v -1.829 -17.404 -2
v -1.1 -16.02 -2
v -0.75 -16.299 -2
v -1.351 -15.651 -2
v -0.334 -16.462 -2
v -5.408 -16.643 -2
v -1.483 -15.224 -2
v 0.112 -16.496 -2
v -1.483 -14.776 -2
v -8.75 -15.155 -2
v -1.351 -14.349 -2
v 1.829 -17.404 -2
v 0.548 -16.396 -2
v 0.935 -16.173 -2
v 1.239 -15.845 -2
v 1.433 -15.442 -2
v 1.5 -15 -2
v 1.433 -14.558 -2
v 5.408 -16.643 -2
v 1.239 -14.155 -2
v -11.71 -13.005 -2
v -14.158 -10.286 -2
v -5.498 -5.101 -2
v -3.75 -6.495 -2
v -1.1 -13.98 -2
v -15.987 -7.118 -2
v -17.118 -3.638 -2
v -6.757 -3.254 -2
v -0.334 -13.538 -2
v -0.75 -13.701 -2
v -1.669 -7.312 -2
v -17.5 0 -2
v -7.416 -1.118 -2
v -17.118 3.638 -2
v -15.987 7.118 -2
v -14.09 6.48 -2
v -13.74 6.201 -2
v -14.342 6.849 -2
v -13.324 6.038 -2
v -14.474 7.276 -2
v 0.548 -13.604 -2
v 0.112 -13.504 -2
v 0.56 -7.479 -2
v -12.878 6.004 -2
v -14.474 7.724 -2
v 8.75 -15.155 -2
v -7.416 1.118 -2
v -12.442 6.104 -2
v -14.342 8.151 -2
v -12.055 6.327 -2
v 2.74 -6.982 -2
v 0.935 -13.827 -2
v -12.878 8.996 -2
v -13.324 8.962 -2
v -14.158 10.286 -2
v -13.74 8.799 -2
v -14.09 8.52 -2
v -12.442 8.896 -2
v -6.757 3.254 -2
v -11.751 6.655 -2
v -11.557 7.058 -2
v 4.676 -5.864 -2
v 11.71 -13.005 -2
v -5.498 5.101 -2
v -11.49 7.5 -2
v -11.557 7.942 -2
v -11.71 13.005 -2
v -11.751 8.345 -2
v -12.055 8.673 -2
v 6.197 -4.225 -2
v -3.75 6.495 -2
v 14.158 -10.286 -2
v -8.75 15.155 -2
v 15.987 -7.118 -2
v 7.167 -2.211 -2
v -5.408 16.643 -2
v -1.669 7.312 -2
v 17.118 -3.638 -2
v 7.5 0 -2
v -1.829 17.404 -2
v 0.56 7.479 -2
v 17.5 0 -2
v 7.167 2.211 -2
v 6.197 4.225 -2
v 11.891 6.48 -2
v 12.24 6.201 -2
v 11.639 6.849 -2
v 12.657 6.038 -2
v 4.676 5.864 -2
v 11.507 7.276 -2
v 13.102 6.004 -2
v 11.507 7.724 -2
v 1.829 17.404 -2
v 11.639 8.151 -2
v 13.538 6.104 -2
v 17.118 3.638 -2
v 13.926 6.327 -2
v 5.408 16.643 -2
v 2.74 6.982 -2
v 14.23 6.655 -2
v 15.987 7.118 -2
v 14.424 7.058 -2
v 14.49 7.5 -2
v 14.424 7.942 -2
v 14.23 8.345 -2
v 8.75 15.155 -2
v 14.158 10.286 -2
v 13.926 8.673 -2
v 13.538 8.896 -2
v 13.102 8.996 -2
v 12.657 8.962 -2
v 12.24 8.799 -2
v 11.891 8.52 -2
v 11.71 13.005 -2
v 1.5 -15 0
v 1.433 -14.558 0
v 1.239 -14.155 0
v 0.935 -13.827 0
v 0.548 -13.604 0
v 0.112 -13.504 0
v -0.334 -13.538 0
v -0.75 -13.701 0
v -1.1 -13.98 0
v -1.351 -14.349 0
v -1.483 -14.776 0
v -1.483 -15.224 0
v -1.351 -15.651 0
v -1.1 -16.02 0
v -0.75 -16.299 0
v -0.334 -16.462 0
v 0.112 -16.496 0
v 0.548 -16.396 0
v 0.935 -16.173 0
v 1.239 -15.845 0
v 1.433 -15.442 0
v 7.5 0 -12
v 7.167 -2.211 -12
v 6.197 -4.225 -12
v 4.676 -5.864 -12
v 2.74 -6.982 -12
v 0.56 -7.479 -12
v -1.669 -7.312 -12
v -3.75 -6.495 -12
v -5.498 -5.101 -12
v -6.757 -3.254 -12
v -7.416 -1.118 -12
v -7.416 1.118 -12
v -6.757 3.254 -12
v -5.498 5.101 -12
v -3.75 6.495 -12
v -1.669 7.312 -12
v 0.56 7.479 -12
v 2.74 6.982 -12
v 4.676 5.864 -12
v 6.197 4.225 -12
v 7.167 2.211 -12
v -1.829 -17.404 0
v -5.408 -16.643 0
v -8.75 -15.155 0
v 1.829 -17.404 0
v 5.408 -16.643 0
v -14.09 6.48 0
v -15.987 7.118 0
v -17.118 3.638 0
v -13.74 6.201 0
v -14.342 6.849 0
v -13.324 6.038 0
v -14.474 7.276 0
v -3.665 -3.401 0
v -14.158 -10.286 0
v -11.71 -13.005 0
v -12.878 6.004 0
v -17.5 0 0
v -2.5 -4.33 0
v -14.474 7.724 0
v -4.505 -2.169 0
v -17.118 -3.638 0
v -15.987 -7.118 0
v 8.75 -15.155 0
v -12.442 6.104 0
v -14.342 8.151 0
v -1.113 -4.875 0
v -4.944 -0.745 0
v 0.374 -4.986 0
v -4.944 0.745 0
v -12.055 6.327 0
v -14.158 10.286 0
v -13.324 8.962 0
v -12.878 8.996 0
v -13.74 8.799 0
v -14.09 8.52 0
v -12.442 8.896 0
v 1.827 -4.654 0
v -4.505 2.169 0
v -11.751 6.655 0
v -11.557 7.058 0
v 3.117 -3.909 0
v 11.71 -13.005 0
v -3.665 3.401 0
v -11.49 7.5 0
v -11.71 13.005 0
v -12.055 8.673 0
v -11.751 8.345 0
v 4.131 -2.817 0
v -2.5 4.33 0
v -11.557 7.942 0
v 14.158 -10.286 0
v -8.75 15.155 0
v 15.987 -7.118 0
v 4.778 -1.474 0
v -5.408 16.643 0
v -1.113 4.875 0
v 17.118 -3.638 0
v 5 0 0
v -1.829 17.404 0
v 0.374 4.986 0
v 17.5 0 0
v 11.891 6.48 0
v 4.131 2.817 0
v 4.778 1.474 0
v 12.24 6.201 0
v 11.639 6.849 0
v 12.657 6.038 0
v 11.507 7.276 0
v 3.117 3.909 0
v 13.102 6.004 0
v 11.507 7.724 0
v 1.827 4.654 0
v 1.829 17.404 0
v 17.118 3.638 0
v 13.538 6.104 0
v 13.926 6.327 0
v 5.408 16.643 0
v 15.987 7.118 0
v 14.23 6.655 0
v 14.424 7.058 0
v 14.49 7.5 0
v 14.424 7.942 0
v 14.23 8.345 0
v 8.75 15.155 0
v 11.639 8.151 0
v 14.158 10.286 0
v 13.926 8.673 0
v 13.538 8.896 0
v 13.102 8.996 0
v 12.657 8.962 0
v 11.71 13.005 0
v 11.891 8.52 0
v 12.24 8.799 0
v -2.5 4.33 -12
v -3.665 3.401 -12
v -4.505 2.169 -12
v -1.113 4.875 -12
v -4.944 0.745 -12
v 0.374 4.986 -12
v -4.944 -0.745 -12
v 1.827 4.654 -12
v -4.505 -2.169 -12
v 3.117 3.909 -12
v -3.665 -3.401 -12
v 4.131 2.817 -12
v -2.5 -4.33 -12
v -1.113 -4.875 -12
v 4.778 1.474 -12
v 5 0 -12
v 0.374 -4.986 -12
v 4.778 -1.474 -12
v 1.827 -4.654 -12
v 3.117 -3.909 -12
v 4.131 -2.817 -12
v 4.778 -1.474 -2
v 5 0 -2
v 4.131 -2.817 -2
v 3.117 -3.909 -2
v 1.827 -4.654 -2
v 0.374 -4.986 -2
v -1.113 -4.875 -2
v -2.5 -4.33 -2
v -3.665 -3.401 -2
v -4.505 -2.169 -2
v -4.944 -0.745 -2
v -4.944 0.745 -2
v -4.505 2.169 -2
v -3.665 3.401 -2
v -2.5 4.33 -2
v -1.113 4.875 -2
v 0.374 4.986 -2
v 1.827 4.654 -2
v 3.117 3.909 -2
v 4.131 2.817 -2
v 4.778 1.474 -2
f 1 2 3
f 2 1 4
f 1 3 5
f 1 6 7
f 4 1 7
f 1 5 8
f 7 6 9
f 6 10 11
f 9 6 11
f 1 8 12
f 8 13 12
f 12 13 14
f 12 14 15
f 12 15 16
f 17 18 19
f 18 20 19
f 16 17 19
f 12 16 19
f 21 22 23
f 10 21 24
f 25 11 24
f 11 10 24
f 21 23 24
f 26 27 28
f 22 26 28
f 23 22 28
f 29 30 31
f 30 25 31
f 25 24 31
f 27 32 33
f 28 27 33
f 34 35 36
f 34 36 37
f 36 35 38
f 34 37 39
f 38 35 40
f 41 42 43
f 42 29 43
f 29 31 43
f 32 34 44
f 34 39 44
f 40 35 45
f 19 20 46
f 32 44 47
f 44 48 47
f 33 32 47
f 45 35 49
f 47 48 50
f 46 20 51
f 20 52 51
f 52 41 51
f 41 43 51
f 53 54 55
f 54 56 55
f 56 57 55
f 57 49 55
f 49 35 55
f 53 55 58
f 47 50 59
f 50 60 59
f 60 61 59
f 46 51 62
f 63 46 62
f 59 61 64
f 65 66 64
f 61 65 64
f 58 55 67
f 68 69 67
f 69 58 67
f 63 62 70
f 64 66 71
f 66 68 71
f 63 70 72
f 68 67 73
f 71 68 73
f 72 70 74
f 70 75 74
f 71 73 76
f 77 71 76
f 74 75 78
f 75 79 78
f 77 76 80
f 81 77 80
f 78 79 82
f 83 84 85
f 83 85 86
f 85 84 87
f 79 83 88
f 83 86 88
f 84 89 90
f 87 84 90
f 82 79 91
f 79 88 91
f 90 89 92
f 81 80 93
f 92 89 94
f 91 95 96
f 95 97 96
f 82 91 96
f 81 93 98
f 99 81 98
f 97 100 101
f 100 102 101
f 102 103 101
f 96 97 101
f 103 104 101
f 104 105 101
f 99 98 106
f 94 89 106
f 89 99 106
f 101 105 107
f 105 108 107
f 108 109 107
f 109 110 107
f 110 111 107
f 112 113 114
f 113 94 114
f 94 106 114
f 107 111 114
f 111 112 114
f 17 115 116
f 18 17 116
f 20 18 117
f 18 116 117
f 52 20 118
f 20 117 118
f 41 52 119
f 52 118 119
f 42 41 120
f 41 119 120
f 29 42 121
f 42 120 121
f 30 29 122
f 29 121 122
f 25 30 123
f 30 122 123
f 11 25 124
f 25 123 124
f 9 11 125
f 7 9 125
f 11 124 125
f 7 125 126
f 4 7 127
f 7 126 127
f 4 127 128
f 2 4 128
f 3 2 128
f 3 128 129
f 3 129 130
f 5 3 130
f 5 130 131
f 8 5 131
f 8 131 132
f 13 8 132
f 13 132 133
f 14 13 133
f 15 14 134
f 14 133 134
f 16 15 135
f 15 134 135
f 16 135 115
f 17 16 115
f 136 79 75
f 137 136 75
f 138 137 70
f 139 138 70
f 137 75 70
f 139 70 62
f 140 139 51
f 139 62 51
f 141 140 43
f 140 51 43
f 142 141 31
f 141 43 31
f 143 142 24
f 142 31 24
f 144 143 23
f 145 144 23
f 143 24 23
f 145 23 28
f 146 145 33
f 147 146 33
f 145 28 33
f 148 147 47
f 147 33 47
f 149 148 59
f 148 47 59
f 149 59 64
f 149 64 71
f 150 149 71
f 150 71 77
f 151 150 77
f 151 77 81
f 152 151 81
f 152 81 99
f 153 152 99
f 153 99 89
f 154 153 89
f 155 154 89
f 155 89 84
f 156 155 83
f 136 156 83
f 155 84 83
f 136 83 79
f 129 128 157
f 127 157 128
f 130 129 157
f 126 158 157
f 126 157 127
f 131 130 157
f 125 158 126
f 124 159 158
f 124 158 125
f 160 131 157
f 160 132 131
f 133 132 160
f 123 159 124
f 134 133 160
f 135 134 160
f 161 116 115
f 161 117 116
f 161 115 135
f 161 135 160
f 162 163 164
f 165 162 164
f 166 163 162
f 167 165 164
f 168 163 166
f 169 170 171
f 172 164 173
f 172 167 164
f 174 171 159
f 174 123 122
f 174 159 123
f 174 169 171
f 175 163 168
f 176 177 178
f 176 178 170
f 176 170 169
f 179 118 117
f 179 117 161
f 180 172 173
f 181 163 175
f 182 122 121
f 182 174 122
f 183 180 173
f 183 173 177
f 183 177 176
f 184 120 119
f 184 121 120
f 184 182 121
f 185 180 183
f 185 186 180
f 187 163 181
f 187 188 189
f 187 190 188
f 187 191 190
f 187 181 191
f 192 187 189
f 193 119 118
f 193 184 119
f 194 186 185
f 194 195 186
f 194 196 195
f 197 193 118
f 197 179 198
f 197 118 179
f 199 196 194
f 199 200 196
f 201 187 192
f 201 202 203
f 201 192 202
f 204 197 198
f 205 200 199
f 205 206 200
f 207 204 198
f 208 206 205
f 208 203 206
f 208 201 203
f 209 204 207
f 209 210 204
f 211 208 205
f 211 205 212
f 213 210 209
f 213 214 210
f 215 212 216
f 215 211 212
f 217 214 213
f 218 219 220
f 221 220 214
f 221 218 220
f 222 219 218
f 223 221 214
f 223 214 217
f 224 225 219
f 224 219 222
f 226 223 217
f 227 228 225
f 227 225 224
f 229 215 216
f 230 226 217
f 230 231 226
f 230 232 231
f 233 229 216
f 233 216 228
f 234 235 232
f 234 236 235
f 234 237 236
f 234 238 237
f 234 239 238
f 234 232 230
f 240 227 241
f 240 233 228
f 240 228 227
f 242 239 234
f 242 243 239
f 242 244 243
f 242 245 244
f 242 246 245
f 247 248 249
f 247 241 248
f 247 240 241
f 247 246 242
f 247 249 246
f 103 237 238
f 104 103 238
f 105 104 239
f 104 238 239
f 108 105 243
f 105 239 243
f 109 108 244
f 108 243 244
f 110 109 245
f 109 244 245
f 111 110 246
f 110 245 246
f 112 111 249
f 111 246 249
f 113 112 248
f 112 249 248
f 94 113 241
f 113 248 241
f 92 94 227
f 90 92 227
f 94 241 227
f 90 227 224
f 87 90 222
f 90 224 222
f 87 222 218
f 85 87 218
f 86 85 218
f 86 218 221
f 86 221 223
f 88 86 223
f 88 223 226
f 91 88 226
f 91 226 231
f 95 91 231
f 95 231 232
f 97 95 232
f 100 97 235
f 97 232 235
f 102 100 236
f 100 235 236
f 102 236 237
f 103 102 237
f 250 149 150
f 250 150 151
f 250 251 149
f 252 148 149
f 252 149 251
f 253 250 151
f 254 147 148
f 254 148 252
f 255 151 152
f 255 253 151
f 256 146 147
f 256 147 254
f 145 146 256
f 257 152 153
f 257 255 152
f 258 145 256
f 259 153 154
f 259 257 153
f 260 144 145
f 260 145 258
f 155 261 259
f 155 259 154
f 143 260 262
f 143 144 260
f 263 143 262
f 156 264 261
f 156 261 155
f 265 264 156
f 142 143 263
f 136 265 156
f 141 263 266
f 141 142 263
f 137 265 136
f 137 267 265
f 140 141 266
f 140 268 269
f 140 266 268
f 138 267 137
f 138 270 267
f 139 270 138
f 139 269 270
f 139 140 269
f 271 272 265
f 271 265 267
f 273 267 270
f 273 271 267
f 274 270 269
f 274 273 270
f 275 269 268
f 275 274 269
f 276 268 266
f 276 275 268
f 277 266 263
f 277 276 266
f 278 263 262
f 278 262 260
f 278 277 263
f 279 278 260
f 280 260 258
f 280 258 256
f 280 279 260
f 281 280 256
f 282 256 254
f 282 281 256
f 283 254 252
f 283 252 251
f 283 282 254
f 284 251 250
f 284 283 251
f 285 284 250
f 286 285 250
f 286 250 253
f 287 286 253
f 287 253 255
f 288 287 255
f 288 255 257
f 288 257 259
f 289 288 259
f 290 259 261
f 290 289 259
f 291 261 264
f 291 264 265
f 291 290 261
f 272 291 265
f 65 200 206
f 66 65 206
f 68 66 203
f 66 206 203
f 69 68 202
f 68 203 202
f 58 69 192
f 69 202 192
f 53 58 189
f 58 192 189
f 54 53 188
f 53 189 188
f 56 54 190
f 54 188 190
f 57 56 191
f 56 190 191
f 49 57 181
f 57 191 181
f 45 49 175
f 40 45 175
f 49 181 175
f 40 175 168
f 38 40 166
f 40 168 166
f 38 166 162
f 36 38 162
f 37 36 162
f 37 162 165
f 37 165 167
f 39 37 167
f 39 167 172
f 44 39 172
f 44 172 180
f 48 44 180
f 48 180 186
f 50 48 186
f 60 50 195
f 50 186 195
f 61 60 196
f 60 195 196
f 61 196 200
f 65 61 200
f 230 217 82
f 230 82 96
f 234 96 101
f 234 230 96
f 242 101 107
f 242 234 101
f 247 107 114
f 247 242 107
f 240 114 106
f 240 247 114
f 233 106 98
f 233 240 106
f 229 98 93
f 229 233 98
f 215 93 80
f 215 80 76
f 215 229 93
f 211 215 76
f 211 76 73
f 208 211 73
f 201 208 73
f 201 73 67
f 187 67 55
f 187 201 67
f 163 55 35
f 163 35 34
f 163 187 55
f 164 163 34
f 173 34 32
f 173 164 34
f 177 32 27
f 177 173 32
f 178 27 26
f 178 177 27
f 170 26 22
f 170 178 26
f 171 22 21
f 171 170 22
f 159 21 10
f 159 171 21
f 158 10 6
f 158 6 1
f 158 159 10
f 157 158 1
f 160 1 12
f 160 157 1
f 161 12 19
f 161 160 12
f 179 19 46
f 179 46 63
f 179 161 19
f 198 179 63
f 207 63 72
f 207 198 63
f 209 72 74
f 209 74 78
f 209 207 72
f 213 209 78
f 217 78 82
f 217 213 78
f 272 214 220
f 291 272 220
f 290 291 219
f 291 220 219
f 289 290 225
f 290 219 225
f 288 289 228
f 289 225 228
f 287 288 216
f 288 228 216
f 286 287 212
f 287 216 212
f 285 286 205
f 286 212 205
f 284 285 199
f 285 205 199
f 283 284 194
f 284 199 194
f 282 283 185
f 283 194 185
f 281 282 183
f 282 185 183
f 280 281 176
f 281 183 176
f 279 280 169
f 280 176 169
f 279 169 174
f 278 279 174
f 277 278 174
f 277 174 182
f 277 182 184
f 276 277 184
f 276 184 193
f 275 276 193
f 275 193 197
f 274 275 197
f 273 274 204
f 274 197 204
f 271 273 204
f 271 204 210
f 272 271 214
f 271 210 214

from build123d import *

# Parameters (mm, degrees)
F0_R     = 17.5
F0_R_2   = 5
F1_DEPTH = 2
F2_R     = 7.5
F2_R_2   = 5
F3_DEPTH = 10
F4_R     = 1.5
F5_DEPTH = 2


with BuildPart() as f1:
    # F0 (on Top) → F1 (new body)
    with BuildSketch(Plane.XY):
        Circle(F0_R)
        Circle(F0_R_2, mode=Mode.SUBTRACT)
    extrude(amount=-F1_DEPTH)

    # F2 (on face) → F3 (join)
    with BuildSketch(Plane(origin=(0, 0, -2), x_dir=(1, 0, 0), z_dir=(0, 0, -1))):
        Circle(F2_R)
        Circle(F2_R_2, mode=Mode.SUBTRACT)
    extrude(amount=F3_DEPTH)

    # F4 (on face) → F5 (cut, through all)
    with BuildSketch(Plane.XY):
        with Locations((-12.990381, 7.5)):
            Circle(F4_R)
        with Locations((12.990381, 7.5)):
            Circle(F4_R)
        with Locations((0, -15)):
            Circle(F4_R)
    extrude(amount=-F5_DEPTH, mode=Mode.SUBTRACT)


solid = f1.part
